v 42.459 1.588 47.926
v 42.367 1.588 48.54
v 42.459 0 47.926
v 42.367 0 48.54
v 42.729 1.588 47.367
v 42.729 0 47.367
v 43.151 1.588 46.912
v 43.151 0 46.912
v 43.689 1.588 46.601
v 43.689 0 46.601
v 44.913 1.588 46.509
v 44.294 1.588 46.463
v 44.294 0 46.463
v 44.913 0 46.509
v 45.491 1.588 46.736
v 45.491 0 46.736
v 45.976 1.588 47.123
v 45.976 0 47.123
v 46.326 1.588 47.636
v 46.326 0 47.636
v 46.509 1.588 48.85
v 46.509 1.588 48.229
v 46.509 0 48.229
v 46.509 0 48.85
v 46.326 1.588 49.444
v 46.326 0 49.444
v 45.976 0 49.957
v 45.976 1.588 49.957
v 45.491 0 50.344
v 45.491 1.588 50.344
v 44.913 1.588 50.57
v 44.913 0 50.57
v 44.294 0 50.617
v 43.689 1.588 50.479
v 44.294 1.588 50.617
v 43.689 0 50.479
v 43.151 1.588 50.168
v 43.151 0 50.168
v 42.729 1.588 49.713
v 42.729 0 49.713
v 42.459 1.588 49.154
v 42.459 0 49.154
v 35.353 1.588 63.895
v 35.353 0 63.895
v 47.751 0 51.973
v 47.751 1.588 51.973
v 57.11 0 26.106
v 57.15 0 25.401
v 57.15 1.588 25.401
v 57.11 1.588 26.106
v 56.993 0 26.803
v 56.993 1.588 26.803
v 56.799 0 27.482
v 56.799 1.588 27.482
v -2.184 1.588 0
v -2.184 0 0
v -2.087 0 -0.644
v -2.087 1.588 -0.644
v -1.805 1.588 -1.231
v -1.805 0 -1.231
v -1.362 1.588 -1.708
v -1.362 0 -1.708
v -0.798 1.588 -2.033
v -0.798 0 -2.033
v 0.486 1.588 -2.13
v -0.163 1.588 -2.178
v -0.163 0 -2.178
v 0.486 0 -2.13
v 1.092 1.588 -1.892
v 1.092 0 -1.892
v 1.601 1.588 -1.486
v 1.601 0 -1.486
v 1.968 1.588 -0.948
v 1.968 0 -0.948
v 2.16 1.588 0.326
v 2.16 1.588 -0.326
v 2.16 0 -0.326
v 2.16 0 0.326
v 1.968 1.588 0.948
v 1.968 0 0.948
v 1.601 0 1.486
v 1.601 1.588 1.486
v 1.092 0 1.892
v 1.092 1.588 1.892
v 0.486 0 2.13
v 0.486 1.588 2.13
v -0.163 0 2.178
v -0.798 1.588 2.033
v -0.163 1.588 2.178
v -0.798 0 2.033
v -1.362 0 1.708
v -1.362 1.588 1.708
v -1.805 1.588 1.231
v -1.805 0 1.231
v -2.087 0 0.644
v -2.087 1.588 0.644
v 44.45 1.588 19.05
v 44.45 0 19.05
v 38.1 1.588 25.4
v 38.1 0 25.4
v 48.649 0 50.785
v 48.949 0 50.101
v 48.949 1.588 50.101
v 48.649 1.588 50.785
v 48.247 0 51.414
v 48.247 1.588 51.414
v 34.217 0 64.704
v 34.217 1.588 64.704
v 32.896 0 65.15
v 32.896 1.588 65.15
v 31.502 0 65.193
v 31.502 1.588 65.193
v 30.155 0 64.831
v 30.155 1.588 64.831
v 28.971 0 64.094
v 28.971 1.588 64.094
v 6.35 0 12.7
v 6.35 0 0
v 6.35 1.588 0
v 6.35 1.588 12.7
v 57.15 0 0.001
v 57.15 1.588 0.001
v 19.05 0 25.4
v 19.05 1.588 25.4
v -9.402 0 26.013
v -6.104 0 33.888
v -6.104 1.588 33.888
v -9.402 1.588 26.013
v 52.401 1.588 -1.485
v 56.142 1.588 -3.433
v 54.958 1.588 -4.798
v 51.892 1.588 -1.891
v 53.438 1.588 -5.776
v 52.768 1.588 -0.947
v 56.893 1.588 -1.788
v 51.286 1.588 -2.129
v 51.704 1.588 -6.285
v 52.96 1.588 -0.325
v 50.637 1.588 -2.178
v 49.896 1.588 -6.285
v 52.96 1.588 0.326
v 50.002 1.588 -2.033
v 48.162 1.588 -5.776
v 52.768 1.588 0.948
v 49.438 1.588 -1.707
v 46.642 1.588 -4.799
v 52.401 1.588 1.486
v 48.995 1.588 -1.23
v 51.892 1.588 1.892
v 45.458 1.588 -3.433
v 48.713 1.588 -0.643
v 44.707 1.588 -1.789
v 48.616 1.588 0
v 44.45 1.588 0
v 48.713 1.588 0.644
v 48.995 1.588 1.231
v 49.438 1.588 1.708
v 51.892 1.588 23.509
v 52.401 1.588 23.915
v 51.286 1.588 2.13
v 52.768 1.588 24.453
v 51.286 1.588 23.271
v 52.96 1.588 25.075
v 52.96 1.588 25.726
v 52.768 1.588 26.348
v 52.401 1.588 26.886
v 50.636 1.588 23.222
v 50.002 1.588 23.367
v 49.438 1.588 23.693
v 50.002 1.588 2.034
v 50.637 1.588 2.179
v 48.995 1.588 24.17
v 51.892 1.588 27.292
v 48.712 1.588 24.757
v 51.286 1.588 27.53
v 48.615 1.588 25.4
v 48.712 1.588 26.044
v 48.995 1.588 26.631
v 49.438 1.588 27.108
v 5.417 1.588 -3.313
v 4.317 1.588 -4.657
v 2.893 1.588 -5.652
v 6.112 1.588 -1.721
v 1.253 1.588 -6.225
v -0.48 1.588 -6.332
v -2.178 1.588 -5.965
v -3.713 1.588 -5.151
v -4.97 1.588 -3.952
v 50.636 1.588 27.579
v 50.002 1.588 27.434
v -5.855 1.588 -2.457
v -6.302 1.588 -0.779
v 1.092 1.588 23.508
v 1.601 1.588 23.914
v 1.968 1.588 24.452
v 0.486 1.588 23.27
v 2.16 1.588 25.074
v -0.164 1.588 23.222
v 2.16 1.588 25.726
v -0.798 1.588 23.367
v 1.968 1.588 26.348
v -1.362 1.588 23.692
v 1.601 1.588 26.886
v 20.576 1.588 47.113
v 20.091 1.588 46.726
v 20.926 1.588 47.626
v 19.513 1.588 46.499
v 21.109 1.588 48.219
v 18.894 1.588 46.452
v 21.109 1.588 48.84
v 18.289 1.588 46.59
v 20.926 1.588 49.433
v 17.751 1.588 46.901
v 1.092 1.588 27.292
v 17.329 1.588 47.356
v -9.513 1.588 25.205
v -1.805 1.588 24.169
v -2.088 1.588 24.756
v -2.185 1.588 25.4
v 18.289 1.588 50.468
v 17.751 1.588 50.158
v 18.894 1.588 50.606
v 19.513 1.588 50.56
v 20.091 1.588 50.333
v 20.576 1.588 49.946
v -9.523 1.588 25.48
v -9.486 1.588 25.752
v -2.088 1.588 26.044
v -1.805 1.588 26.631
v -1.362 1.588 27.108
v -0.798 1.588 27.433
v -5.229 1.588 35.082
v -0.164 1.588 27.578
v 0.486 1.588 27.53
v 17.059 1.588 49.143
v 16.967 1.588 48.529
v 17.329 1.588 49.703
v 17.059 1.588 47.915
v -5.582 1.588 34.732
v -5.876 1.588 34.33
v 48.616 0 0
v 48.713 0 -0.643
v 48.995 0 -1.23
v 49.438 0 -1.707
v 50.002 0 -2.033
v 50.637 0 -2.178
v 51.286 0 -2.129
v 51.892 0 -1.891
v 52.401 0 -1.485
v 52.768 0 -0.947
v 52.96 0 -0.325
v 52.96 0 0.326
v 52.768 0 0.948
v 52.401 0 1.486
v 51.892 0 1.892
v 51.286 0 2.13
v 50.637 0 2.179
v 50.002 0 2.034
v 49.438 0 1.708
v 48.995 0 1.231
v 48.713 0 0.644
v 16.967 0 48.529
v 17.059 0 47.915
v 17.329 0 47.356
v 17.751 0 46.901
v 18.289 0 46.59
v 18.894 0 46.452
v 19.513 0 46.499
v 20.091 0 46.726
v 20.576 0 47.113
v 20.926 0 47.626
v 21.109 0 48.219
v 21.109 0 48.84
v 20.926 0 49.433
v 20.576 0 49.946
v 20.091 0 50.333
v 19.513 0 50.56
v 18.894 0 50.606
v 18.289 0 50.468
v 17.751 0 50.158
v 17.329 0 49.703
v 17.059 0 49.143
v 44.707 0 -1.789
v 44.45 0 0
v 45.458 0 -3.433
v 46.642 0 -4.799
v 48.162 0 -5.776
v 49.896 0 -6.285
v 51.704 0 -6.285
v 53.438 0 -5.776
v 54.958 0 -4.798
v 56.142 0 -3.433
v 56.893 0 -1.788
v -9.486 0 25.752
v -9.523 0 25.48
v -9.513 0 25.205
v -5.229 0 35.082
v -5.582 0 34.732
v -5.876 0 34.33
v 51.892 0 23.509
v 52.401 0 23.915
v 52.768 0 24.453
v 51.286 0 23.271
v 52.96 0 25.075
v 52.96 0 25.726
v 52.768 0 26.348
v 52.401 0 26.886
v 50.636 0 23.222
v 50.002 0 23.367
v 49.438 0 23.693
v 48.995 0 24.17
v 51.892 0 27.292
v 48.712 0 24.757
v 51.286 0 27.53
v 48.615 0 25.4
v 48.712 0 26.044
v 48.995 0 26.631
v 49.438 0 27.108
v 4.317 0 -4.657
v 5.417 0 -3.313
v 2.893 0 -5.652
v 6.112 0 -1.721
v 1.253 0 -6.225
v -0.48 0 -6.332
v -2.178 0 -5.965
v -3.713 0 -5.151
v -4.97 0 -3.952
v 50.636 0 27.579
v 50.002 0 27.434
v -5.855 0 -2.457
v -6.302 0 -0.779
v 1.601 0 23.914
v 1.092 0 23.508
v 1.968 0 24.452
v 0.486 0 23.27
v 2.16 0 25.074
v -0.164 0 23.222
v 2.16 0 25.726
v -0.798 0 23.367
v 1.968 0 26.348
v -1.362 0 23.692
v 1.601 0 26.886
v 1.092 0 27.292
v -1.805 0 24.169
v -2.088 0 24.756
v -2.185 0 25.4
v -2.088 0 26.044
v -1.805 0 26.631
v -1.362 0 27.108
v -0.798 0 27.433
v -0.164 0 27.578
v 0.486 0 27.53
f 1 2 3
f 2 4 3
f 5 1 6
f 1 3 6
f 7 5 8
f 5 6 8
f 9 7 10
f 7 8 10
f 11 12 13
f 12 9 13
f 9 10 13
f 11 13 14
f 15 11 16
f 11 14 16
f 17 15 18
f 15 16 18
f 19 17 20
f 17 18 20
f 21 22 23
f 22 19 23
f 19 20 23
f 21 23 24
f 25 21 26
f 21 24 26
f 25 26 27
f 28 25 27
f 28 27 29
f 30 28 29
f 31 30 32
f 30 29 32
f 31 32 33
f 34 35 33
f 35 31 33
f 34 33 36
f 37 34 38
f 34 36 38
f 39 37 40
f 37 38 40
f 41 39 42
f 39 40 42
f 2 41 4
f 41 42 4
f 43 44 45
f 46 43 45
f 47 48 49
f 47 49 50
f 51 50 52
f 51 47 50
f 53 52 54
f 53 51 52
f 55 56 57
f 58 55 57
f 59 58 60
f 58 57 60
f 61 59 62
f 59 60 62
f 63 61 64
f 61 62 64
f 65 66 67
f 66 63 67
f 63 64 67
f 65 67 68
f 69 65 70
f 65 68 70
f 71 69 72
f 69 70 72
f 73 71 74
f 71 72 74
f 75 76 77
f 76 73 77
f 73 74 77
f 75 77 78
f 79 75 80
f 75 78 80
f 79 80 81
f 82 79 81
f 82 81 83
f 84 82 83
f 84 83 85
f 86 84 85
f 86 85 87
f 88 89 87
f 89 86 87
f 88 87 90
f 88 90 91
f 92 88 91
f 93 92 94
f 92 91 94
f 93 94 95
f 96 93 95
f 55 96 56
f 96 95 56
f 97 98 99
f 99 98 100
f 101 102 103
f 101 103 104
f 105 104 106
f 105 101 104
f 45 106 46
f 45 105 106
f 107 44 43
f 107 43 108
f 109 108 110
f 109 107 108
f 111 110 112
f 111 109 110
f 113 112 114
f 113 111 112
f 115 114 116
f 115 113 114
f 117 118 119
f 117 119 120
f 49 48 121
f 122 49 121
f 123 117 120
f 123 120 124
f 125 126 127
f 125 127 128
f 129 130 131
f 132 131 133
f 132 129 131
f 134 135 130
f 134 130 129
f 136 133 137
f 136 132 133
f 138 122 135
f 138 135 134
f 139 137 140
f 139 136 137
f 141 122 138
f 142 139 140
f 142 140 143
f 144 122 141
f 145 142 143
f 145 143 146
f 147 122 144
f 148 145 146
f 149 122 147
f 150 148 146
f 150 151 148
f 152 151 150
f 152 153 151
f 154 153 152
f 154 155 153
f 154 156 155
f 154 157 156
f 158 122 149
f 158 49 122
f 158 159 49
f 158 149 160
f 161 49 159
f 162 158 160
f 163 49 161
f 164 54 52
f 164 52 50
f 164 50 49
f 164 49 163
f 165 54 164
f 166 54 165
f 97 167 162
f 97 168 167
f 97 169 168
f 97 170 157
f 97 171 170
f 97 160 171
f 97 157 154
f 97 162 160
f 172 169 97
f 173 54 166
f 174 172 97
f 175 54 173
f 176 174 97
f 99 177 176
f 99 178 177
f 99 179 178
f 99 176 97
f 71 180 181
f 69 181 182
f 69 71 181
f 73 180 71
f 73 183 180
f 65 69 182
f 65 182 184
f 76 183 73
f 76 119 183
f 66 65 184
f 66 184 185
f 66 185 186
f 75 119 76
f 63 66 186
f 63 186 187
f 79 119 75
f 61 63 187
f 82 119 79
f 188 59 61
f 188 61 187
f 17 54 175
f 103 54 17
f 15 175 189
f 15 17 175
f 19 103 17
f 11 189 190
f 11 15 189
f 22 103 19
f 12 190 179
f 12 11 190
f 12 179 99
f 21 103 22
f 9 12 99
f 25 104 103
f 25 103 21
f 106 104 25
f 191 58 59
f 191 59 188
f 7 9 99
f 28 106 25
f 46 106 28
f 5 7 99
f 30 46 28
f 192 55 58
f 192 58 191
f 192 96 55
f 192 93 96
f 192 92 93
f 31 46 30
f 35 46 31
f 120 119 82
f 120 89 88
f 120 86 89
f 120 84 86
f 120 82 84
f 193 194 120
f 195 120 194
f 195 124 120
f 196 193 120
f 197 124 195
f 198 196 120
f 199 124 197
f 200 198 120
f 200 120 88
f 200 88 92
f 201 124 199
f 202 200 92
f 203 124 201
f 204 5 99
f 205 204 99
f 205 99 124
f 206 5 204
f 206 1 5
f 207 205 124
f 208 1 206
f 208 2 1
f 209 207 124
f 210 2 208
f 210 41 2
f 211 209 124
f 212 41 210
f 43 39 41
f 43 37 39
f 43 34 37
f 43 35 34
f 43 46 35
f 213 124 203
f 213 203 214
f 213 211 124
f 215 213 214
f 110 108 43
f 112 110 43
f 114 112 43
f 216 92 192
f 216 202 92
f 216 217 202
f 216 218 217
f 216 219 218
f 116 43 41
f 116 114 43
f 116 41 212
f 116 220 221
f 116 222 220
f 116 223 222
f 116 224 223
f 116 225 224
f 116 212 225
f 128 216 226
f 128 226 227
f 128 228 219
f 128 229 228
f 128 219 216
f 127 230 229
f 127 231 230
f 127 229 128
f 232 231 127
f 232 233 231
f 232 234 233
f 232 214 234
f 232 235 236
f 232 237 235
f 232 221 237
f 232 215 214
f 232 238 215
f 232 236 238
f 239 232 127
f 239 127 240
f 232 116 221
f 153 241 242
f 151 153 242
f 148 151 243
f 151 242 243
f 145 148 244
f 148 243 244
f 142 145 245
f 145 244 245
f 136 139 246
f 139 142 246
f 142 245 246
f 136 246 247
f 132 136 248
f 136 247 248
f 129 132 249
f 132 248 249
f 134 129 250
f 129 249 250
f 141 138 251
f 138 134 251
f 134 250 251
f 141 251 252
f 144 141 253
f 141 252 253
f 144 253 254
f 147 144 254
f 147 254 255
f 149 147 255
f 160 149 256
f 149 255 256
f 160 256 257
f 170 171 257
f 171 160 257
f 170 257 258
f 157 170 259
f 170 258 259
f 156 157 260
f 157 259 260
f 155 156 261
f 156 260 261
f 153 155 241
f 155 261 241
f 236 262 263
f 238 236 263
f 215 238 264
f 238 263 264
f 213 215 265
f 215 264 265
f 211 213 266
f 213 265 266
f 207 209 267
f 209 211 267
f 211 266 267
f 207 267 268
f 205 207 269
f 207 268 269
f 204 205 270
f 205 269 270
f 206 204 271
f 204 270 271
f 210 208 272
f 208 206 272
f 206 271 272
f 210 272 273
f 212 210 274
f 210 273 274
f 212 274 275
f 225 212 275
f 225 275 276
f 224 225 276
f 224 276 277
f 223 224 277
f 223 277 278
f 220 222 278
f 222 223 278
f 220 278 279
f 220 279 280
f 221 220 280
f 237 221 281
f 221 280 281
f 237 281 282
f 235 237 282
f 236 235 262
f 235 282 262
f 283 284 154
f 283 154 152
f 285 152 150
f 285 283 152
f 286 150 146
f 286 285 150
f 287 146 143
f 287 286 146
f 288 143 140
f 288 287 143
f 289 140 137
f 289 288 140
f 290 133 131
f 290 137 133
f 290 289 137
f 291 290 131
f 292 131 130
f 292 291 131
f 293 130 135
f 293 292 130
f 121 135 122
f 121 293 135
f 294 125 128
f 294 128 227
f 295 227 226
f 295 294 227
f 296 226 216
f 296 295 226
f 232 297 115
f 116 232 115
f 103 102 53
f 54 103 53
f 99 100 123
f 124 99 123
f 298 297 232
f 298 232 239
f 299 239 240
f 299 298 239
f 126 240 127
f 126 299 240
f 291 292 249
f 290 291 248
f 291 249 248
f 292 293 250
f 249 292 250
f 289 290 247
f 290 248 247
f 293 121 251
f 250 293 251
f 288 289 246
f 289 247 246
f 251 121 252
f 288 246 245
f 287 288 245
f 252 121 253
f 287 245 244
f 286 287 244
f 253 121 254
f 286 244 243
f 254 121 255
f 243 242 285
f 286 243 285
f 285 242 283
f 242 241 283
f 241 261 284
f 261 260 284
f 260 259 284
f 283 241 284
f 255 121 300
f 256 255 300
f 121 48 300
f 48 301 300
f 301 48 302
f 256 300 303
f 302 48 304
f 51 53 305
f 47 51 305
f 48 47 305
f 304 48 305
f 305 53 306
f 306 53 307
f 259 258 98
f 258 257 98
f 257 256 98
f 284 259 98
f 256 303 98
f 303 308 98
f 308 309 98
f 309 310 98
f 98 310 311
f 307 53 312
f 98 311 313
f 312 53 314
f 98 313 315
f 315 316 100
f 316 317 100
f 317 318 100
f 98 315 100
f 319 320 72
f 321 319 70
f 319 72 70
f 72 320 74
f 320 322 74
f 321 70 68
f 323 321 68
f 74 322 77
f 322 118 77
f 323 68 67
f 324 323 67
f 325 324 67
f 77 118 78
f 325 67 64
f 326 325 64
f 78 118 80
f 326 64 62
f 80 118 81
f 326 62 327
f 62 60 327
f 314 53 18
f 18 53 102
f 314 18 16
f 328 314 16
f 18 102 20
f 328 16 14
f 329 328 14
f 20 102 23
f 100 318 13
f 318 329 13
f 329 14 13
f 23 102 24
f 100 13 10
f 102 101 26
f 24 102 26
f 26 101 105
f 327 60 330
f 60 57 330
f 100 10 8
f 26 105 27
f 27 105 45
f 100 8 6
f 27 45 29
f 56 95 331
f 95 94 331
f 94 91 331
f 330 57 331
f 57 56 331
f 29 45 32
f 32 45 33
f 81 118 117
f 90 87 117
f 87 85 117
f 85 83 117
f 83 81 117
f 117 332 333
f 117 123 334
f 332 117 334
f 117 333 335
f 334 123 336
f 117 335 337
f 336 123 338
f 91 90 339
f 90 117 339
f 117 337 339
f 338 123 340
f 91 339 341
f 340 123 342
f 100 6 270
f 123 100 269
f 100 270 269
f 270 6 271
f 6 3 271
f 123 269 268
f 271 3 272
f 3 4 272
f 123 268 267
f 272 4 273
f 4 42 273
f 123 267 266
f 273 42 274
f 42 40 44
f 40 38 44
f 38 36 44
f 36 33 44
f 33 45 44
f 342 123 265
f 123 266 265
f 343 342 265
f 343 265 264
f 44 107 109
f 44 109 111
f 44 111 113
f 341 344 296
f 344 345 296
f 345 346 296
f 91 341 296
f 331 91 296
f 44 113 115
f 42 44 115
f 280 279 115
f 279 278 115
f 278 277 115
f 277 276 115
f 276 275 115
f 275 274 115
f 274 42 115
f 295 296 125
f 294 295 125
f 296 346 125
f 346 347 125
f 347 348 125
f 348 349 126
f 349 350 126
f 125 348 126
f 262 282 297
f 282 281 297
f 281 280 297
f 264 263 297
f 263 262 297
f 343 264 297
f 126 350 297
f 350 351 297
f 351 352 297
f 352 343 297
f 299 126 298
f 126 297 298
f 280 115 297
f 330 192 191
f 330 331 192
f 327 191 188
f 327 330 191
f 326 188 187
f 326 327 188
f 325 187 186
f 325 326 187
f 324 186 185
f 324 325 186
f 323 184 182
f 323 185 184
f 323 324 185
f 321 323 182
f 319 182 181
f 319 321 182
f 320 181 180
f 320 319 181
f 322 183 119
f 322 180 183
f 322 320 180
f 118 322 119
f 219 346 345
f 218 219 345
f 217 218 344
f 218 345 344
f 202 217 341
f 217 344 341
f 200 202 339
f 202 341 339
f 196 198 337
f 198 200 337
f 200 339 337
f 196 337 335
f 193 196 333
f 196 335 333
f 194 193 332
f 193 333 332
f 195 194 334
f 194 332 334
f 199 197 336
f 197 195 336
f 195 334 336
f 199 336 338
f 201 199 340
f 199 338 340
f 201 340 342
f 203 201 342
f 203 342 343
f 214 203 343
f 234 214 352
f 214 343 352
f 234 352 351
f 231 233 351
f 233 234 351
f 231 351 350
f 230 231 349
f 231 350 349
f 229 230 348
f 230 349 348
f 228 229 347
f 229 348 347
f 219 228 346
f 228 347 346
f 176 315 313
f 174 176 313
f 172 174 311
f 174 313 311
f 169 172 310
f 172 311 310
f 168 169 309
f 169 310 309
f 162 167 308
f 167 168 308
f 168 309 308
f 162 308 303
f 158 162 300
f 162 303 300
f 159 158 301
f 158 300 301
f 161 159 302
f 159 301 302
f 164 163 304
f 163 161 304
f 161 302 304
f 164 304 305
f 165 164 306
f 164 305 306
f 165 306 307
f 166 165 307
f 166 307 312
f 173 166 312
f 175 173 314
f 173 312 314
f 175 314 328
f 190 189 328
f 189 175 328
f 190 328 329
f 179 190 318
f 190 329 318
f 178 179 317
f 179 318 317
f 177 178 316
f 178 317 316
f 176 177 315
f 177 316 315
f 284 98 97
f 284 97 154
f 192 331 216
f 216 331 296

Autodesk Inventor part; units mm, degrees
ref_plane "YZ Plane" through (0, 0, 0) normal (1, 0, 0) x (0, 1, 0)
ref_plane "XZ Plane" through (0, 0, 0) normal (0, 1, 0) x (-1, 0, 0)
ref_plane "XY Plane" through (0, 0, 0) normal (0, 0, 1) x (1, 0, 0)
sketch "main" plane through (0, 0, 0) normal (0, 0, 1) x (1, 0, 0)
  circle A0 centre (9.0037, 34.4943) radius 2.1844
  line L0 (21.7037, 28.1443) -> (9.0037, 15.4443)
  line L1 (34.4037, 28.1443) -> (21.7037, 28.1443)
  circle A1 centre (34.4037, 34.4943) radius 2.1844
  arc A2 (34.4037, 28.1443) -> (34.4037, 40.8443) centre (34.4037, 34.4943) ccw
  arc A3 (-17.5684, -13.257) -> (-15.6972, -14.455) centre (-14.1357, -9.9557) ccw
  circle A4 centre (-14.1357, -9.9557) radius 2.0828
  line L2 (-15.6972, -14.455) -> (6.9217, -22.3047)
  circle A5 centre (-14.1255, 15.4443) radius 2.0828
  line L3 (-29.4913, -0.8595) -> (-17.5684, -13.257)
  arc A6 (-29.6904, 5.5225) -> (-29.4913, -0.8595) centre (-26.0586, 2.4417) ccw
  line L4 (-0.6786, 39.7231) -> (-29.6904, 5.5225)
  line L5 (9.0037, -3.6057) -> (9.0037, 15.4443)
  line L6 (15.3537, -9.9557) -> (34.4037, -9.9557)
  line L7 (15.3537, -9.9557) -> (9.0037, -3.6057)
  circle A7 centre (34.4037, -16.3057) radius 2.1844
  arc A8 (34.4037, -22.6557) -> (34.4037, -9.9557) centre (34.4037, -16.3057) ccw
  circle A9 centre (9.0037, -16.3057) radius 2.1844
  arc A10 (6.9217, -22.3047) -> (9.0037, -22.6557) centre (9.0037, -16.3057) ccw
  line L8 (9.0037, -22.6557) -> (34.4037, -22.6557)
  arc A11 (0.516, 40.5978) -> (-0.6786, 39.7231) centre (1.7426, 37.6693) ccw
  arc A12 (9.1983, 44.0073) -> (8.3903, 43.896) centre (9.0036, 42.4318) ccw
  line L9 (0.516, 40.5978) -> (8.3903, 43.896)
  line L10 (35.1824, 40.7963) -> (9.1983, 44.0073)
  point P0 (6.3419, 6.6617)
  point P1 (9.0037, 28.1443)
  point P2 (0.2724, 40.8443)
  point P3 (-32.4736, 2.2415)
  point P4 (9.0037, -9.9557)
  dimension "d0" = 4.1656
  dimension "d1" = 9.525
  dimension "d2" = 12.7
  dimension "d3" = 12.7
  dimension "d4" = 6.35
  dimension "d5" = 6.35
  dimension "d6" = 4.1656
  dimension "d7" = 4.7625
  dimension "d9" = 3.175
  dimension "d12" = 48.5394
  dimension "d14" = 3.175
  dimension "d16" = 25.4
  dimension "d17" = 48.5291
  dimension "d18" = 6.35
sketch "Sketch1" plane through (0, 0, 0) normal (0, 1, 0) x (-1, 0, 0)
  circle A0 centre (0.0003, 25.4) radius 2.1844
  line L0 (-6.3499, 12.7001) -> (-19.0497, 25.4002)
  line L1 (-6.35, 0.0001) -> (-6.3499, 12.7001)
  circle A1 centre (0, 0) radius 2.1844
  arc A2 (-6.35, 0.0001) -> (6.35, -0.0001) centre (0, 0) ccw
  arc A3 (-47.7507, 51.9726) -> (-48.9487, 50.1014) centre (-44.4495, 48.5399) ccw
  circle A4 centre (-44.4495, 48.5399) radius 2.0828
  line L2 (-48.9487, 50.1014) -> (-56.7987, 27.4825)
  circle A5 centre (-19.0495, 48.5293) radius 2.0828
  line L3 (-35.3531, 63.8953) -> (-47.7507, 51.9726)
  arc A6 (-28.9711, 64.0944) -> (-35.3531, 63.8953) centre (-32.0519, 60.4626) ccw
  line L4 (5.2292, 35.0822) -> (-28.9711, 64.0944)
  line L5 (-38.0997, 25.4004) -> (-19.0497, 25.4002)
  line L6 (-44.4498, 19.0505) -> (-44.45, 0.0005)
  line L7 (-44.4498, 19.0505) -> (-38.0997, 25.4004)
  circle A7 centre (-50.8, 0.0005) radius 2.1844
  arc A8 (-57.15, 0.0006) -> (-44.45, 0.0005) centre (-50.8, 0.0005) ccw
  circle A9 centre (-50.7997, 25.4005) radius 2.1844
  arc A10 (-56.7987, 27.4825) -> (-57.1497, 25.4006) centre (-50.7997, 25.4005) ccw
  line L8 (-57.1497, 25.4006) -> (-57.15, 0.0006)
  arc A11 (6.1038, 33.8876) -> (5.2292, 35.0822) centre (3.1753, 32.661) ccw
  arc A12 (9.5133, 25.2052) -> (9.402, 26.0132) centre (7.9378, 25.3999) ccw
  line L9 (6.1038, 33.8876) -> (9.402, 26.0132)
  line L10 (6.3021, -0.7788) -> (9.5133, 25.2052)
  point P0 (0, 0)
extrude "Extrusion1" add sketch "Sketch1" along normal blind 1.5875
equation "\"d3\" = d2"
equation "\"d5\" = d4"
properties part number "gusset" material "Acetal Resin, White"
